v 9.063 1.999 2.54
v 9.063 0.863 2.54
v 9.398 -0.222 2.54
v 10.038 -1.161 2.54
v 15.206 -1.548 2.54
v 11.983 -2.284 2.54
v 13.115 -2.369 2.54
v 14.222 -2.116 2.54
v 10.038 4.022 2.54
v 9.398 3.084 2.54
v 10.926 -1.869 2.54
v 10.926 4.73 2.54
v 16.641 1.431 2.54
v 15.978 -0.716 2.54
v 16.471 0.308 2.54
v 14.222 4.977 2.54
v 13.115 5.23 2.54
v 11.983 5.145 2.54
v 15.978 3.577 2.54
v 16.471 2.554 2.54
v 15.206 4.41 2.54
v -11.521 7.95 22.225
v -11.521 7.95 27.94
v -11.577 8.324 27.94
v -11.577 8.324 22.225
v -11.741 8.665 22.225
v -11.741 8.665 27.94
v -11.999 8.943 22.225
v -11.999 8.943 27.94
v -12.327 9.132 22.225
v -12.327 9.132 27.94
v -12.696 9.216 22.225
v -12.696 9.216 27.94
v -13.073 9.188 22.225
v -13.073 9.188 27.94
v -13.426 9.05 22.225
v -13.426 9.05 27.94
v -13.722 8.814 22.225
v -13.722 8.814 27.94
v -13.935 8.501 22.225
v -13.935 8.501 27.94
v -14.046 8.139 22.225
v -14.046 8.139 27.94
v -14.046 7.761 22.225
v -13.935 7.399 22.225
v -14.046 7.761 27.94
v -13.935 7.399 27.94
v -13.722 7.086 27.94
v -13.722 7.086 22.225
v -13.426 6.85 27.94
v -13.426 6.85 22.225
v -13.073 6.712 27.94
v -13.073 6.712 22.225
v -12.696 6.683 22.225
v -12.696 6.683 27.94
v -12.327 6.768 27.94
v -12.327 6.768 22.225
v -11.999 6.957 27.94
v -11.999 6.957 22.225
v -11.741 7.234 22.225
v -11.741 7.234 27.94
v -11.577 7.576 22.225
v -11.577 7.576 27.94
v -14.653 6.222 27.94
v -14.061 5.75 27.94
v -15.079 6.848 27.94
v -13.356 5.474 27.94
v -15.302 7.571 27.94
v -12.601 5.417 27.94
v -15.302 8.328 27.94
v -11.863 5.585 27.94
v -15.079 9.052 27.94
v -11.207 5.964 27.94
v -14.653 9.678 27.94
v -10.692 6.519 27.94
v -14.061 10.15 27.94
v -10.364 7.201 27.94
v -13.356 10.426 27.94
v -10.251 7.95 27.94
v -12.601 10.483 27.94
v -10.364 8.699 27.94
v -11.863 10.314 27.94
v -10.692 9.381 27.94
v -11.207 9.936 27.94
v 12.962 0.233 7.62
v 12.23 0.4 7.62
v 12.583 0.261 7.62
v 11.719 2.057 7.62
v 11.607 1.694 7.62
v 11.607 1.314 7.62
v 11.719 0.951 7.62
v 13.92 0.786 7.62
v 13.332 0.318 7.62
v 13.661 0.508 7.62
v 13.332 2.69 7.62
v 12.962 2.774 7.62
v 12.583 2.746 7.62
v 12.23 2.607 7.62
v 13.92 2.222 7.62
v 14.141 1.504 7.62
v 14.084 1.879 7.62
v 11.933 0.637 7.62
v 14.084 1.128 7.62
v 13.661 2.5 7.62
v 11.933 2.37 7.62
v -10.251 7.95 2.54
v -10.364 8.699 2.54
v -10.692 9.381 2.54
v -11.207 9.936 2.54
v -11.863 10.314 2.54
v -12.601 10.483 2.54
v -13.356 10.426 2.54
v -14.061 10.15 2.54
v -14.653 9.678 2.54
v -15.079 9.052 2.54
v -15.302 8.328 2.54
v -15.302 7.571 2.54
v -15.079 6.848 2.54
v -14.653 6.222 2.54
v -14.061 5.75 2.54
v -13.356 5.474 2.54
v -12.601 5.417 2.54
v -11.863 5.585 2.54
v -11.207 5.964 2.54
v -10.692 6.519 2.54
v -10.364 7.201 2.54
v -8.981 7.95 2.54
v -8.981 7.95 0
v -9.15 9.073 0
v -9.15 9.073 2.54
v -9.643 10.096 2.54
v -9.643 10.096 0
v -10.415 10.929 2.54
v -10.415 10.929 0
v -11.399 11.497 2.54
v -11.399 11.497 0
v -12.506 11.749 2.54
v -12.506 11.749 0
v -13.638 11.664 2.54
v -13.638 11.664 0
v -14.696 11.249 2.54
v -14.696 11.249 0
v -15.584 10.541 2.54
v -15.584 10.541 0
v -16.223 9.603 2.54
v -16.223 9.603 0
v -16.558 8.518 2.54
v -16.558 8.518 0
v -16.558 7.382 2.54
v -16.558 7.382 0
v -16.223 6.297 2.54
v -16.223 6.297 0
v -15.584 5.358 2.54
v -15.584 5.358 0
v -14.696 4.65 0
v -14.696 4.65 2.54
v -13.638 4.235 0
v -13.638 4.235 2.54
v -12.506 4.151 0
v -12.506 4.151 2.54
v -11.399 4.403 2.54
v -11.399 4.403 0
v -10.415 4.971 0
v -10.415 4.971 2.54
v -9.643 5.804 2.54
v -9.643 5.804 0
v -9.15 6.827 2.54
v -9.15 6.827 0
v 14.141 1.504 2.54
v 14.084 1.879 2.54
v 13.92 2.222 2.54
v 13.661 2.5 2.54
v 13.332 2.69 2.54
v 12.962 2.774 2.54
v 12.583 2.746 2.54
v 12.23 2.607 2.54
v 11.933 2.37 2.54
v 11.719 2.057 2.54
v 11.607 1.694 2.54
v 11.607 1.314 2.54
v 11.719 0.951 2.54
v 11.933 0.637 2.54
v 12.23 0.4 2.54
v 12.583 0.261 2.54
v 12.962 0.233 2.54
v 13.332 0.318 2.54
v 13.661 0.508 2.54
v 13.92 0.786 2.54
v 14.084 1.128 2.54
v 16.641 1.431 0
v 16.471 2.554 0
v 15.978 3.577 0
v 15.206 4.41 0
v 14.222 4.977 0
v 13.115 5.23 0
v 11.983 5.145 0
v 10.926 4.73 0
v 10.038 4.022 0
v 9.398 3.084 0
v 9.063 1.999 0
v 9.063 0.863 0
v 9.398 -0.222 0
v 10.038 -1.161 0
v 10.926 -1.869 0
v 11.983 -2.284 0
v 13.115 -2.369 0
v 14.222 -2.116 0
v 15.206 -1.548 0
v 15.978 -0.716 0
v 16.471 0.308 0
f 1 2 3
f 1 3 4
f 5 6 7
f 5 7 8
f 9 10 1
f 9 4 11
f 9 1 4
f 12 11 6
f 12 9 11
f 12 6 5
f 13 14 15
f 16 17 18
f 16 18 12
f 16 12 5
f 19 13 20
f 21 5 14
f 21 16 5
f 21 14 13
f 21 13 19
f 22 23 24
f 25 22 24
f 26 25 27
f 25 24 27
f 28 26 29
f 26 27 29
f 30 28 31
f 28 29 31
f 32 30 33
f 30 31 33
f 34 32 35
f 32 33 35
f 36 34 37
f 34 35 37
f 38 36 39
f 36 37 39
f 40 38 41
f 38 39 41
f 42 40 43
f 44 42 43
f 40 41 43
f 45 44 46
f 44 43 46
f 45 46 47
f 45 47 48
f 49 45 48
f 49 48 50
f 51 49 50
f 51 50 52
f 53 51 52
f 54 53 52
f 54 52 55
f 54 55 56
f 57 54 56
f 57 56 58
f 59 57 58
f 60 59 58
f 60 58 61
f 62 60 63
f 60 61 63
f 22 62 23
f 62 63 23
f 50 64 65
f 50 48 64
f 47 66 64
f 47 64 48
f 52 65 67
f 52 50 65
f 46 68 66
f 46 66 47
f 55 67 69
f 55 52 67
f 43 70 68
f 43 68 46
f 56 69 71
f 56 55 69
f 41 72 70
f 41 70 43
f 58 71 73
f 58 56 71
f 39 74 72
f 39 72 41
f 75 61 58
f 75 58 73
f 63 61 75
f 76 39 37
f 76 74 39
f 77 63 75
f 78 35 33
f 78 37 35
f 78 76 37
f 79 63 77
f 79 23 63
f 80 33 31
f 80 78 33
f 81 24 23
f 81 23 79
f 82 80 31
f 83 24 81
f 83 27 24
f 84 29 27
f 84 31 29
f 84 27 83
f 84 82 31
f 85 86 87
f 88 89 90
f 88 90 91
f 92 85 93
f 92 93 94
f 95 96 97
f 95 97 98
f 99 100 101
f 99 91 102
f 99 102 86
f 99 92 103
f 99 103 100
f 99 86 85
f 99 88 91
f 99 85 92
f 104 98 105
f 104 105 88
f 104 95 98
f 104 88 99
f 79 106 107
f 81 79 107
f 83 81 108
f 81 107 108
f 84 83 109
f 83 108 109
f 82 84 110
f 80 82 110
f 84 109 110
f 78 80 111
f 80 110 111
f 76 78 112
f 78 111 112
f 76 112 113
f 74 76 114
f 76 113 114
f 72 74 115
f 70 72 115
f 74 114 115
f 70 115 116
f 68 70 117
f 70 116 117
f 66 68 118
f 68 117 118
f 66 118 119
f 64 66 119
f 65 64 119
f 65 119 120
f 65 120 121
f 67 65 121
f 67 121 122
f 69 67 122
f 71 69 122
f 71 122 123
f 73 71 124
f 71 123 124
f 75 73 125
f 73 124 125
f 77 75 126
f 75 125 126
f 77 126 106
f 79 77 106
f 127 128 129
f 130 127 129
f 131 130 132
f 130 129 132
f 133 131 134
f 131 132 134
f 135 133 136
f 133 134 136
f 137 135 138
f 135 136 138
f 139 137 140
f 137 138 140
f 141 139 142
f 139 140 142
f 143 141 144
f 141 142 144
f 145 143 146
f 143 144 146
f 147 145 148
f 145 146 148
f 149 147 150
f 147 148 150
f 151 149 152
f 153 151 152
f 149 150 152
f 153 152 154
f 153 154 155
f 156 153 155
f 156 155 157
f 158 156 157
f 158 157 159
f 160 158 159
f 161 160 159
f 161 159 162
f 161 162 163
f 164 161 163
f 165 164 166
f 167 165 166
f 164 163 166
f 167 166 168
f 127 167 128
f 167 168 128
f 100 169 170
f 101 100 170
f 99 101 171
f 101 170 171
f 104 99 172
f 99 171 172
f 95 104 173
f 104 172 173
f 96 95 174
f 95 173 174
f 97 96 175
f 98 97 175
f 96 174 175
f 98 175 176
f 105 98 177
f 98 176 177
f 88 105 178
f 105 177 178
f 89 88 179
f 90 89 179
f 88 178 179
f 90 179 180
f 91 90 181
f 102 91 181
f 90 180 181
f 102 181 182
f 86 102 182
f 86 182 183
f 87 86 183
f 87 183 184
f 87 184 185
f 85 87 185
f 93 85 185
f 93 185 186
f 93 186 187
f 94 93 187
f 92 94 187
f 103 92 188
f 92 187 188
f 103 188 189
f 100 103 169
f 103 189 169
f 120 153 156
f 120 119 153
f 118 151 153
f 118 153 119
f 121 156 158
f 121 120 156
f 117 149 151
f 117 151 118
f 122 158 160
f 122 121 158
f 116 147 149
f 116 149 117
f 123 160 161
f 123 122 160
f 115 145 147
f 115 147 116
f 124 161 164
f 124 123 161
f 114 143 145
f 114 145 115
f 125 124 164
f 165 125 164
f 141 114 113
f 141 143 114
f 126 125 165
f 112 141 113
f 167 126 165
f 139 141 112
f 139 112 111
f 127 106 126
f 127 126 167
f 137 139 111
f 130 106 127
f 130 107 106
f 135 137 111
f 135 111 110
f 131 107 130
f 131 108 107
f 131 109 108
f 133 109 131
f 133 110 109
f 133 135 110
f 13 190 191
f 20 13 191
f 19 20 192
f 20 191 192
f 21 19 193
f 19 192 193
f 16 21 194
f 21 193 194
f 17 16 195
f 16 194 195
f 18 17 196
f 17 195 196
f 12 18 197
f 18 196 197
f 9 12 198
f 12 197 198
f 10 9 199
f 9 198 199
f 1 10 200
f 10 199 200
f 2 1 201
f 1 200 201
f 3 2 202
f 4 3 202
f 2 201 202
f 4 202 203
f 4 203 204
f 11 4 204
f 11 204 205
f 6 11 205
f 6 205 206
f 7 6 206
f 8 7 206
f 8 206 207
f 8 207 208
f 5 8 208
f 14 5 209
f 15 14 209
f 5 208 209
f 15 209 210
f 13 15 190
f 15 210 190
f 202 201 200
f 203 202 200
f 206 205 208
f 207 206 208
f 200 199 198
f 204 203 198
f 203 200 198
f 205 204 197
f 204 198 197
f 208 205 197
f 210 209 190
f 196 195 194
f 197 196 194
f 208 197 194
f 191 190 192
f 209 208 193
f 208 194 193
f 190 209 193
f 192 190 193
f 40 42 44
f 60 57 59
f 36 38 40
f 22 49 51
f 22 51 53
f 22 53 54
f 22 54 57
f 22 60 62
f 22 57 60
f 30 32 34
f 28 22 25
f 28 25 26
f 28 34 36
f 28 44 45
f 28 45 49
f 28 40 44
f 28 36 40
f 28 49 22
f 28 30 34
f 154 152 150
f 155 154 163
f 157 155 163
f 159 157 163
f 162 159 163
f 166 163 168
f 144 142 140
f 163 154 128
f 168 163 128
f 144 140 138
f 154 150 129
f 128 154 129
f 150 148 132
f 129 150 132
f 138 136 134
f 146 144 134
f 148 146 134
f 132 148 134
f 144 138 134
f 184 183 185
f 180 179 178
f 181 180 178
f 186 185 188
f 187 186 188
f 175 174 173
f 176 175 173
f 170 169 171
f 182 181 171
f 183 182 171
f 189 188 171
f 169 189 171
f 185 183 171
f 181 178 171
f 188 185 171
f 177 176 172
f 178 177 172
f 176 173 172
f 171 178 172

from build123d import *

# Parameters (mm, degrees)
F0_R     = 3.81
F1_DEPTH = 2.54
F2_R     = 1.274241
F3_DEPTH = 5.08
F4_R     = 2.54
F5_DEPTH = 25.4
F6_R     = 1.27
F7_DEPTH = 5.715


with BuildPart() as f1:
    # F0 (on Top) → F1 (new body)
    with BuildSketch(Plane.XY):
        with Locations((12.830512, 1.430729)):
            Circle(F0_R)
        with Locations((-12.79066, 7.94989)):
            Circle(F0_R)
    extrude(amount=F1_DEPTH)

    # F4 (on face) → F5 (join)
    with BuildSketch(Plane.XY.offset(2.54)):
        with Locations((-12.79066, 7.94989)):
            Circle(F4_R)
    extrude(amount=F5_DEPTH)

    # F6 (on face) → F7 (cut)
    with BuildSketch(Plane.XY.offset(27.94)):
        with Locations((-12.79066, 7.94989)):
            Circle(F6_R)
    extrude(amount=-F7_DEPTH, mode=Mode.SUBTRACT)


with BuildPart() as f3:
    # F2 (on face) → F3 (new body)
    with BuildSketch(Plane.XY.offset(2.54)):
        with Locations((12.866688, 1.503748)):
            Circle(F2_R)
    extrude(amount=F3_DEPTH)


solid = Compound([f1.part, f3.part])
